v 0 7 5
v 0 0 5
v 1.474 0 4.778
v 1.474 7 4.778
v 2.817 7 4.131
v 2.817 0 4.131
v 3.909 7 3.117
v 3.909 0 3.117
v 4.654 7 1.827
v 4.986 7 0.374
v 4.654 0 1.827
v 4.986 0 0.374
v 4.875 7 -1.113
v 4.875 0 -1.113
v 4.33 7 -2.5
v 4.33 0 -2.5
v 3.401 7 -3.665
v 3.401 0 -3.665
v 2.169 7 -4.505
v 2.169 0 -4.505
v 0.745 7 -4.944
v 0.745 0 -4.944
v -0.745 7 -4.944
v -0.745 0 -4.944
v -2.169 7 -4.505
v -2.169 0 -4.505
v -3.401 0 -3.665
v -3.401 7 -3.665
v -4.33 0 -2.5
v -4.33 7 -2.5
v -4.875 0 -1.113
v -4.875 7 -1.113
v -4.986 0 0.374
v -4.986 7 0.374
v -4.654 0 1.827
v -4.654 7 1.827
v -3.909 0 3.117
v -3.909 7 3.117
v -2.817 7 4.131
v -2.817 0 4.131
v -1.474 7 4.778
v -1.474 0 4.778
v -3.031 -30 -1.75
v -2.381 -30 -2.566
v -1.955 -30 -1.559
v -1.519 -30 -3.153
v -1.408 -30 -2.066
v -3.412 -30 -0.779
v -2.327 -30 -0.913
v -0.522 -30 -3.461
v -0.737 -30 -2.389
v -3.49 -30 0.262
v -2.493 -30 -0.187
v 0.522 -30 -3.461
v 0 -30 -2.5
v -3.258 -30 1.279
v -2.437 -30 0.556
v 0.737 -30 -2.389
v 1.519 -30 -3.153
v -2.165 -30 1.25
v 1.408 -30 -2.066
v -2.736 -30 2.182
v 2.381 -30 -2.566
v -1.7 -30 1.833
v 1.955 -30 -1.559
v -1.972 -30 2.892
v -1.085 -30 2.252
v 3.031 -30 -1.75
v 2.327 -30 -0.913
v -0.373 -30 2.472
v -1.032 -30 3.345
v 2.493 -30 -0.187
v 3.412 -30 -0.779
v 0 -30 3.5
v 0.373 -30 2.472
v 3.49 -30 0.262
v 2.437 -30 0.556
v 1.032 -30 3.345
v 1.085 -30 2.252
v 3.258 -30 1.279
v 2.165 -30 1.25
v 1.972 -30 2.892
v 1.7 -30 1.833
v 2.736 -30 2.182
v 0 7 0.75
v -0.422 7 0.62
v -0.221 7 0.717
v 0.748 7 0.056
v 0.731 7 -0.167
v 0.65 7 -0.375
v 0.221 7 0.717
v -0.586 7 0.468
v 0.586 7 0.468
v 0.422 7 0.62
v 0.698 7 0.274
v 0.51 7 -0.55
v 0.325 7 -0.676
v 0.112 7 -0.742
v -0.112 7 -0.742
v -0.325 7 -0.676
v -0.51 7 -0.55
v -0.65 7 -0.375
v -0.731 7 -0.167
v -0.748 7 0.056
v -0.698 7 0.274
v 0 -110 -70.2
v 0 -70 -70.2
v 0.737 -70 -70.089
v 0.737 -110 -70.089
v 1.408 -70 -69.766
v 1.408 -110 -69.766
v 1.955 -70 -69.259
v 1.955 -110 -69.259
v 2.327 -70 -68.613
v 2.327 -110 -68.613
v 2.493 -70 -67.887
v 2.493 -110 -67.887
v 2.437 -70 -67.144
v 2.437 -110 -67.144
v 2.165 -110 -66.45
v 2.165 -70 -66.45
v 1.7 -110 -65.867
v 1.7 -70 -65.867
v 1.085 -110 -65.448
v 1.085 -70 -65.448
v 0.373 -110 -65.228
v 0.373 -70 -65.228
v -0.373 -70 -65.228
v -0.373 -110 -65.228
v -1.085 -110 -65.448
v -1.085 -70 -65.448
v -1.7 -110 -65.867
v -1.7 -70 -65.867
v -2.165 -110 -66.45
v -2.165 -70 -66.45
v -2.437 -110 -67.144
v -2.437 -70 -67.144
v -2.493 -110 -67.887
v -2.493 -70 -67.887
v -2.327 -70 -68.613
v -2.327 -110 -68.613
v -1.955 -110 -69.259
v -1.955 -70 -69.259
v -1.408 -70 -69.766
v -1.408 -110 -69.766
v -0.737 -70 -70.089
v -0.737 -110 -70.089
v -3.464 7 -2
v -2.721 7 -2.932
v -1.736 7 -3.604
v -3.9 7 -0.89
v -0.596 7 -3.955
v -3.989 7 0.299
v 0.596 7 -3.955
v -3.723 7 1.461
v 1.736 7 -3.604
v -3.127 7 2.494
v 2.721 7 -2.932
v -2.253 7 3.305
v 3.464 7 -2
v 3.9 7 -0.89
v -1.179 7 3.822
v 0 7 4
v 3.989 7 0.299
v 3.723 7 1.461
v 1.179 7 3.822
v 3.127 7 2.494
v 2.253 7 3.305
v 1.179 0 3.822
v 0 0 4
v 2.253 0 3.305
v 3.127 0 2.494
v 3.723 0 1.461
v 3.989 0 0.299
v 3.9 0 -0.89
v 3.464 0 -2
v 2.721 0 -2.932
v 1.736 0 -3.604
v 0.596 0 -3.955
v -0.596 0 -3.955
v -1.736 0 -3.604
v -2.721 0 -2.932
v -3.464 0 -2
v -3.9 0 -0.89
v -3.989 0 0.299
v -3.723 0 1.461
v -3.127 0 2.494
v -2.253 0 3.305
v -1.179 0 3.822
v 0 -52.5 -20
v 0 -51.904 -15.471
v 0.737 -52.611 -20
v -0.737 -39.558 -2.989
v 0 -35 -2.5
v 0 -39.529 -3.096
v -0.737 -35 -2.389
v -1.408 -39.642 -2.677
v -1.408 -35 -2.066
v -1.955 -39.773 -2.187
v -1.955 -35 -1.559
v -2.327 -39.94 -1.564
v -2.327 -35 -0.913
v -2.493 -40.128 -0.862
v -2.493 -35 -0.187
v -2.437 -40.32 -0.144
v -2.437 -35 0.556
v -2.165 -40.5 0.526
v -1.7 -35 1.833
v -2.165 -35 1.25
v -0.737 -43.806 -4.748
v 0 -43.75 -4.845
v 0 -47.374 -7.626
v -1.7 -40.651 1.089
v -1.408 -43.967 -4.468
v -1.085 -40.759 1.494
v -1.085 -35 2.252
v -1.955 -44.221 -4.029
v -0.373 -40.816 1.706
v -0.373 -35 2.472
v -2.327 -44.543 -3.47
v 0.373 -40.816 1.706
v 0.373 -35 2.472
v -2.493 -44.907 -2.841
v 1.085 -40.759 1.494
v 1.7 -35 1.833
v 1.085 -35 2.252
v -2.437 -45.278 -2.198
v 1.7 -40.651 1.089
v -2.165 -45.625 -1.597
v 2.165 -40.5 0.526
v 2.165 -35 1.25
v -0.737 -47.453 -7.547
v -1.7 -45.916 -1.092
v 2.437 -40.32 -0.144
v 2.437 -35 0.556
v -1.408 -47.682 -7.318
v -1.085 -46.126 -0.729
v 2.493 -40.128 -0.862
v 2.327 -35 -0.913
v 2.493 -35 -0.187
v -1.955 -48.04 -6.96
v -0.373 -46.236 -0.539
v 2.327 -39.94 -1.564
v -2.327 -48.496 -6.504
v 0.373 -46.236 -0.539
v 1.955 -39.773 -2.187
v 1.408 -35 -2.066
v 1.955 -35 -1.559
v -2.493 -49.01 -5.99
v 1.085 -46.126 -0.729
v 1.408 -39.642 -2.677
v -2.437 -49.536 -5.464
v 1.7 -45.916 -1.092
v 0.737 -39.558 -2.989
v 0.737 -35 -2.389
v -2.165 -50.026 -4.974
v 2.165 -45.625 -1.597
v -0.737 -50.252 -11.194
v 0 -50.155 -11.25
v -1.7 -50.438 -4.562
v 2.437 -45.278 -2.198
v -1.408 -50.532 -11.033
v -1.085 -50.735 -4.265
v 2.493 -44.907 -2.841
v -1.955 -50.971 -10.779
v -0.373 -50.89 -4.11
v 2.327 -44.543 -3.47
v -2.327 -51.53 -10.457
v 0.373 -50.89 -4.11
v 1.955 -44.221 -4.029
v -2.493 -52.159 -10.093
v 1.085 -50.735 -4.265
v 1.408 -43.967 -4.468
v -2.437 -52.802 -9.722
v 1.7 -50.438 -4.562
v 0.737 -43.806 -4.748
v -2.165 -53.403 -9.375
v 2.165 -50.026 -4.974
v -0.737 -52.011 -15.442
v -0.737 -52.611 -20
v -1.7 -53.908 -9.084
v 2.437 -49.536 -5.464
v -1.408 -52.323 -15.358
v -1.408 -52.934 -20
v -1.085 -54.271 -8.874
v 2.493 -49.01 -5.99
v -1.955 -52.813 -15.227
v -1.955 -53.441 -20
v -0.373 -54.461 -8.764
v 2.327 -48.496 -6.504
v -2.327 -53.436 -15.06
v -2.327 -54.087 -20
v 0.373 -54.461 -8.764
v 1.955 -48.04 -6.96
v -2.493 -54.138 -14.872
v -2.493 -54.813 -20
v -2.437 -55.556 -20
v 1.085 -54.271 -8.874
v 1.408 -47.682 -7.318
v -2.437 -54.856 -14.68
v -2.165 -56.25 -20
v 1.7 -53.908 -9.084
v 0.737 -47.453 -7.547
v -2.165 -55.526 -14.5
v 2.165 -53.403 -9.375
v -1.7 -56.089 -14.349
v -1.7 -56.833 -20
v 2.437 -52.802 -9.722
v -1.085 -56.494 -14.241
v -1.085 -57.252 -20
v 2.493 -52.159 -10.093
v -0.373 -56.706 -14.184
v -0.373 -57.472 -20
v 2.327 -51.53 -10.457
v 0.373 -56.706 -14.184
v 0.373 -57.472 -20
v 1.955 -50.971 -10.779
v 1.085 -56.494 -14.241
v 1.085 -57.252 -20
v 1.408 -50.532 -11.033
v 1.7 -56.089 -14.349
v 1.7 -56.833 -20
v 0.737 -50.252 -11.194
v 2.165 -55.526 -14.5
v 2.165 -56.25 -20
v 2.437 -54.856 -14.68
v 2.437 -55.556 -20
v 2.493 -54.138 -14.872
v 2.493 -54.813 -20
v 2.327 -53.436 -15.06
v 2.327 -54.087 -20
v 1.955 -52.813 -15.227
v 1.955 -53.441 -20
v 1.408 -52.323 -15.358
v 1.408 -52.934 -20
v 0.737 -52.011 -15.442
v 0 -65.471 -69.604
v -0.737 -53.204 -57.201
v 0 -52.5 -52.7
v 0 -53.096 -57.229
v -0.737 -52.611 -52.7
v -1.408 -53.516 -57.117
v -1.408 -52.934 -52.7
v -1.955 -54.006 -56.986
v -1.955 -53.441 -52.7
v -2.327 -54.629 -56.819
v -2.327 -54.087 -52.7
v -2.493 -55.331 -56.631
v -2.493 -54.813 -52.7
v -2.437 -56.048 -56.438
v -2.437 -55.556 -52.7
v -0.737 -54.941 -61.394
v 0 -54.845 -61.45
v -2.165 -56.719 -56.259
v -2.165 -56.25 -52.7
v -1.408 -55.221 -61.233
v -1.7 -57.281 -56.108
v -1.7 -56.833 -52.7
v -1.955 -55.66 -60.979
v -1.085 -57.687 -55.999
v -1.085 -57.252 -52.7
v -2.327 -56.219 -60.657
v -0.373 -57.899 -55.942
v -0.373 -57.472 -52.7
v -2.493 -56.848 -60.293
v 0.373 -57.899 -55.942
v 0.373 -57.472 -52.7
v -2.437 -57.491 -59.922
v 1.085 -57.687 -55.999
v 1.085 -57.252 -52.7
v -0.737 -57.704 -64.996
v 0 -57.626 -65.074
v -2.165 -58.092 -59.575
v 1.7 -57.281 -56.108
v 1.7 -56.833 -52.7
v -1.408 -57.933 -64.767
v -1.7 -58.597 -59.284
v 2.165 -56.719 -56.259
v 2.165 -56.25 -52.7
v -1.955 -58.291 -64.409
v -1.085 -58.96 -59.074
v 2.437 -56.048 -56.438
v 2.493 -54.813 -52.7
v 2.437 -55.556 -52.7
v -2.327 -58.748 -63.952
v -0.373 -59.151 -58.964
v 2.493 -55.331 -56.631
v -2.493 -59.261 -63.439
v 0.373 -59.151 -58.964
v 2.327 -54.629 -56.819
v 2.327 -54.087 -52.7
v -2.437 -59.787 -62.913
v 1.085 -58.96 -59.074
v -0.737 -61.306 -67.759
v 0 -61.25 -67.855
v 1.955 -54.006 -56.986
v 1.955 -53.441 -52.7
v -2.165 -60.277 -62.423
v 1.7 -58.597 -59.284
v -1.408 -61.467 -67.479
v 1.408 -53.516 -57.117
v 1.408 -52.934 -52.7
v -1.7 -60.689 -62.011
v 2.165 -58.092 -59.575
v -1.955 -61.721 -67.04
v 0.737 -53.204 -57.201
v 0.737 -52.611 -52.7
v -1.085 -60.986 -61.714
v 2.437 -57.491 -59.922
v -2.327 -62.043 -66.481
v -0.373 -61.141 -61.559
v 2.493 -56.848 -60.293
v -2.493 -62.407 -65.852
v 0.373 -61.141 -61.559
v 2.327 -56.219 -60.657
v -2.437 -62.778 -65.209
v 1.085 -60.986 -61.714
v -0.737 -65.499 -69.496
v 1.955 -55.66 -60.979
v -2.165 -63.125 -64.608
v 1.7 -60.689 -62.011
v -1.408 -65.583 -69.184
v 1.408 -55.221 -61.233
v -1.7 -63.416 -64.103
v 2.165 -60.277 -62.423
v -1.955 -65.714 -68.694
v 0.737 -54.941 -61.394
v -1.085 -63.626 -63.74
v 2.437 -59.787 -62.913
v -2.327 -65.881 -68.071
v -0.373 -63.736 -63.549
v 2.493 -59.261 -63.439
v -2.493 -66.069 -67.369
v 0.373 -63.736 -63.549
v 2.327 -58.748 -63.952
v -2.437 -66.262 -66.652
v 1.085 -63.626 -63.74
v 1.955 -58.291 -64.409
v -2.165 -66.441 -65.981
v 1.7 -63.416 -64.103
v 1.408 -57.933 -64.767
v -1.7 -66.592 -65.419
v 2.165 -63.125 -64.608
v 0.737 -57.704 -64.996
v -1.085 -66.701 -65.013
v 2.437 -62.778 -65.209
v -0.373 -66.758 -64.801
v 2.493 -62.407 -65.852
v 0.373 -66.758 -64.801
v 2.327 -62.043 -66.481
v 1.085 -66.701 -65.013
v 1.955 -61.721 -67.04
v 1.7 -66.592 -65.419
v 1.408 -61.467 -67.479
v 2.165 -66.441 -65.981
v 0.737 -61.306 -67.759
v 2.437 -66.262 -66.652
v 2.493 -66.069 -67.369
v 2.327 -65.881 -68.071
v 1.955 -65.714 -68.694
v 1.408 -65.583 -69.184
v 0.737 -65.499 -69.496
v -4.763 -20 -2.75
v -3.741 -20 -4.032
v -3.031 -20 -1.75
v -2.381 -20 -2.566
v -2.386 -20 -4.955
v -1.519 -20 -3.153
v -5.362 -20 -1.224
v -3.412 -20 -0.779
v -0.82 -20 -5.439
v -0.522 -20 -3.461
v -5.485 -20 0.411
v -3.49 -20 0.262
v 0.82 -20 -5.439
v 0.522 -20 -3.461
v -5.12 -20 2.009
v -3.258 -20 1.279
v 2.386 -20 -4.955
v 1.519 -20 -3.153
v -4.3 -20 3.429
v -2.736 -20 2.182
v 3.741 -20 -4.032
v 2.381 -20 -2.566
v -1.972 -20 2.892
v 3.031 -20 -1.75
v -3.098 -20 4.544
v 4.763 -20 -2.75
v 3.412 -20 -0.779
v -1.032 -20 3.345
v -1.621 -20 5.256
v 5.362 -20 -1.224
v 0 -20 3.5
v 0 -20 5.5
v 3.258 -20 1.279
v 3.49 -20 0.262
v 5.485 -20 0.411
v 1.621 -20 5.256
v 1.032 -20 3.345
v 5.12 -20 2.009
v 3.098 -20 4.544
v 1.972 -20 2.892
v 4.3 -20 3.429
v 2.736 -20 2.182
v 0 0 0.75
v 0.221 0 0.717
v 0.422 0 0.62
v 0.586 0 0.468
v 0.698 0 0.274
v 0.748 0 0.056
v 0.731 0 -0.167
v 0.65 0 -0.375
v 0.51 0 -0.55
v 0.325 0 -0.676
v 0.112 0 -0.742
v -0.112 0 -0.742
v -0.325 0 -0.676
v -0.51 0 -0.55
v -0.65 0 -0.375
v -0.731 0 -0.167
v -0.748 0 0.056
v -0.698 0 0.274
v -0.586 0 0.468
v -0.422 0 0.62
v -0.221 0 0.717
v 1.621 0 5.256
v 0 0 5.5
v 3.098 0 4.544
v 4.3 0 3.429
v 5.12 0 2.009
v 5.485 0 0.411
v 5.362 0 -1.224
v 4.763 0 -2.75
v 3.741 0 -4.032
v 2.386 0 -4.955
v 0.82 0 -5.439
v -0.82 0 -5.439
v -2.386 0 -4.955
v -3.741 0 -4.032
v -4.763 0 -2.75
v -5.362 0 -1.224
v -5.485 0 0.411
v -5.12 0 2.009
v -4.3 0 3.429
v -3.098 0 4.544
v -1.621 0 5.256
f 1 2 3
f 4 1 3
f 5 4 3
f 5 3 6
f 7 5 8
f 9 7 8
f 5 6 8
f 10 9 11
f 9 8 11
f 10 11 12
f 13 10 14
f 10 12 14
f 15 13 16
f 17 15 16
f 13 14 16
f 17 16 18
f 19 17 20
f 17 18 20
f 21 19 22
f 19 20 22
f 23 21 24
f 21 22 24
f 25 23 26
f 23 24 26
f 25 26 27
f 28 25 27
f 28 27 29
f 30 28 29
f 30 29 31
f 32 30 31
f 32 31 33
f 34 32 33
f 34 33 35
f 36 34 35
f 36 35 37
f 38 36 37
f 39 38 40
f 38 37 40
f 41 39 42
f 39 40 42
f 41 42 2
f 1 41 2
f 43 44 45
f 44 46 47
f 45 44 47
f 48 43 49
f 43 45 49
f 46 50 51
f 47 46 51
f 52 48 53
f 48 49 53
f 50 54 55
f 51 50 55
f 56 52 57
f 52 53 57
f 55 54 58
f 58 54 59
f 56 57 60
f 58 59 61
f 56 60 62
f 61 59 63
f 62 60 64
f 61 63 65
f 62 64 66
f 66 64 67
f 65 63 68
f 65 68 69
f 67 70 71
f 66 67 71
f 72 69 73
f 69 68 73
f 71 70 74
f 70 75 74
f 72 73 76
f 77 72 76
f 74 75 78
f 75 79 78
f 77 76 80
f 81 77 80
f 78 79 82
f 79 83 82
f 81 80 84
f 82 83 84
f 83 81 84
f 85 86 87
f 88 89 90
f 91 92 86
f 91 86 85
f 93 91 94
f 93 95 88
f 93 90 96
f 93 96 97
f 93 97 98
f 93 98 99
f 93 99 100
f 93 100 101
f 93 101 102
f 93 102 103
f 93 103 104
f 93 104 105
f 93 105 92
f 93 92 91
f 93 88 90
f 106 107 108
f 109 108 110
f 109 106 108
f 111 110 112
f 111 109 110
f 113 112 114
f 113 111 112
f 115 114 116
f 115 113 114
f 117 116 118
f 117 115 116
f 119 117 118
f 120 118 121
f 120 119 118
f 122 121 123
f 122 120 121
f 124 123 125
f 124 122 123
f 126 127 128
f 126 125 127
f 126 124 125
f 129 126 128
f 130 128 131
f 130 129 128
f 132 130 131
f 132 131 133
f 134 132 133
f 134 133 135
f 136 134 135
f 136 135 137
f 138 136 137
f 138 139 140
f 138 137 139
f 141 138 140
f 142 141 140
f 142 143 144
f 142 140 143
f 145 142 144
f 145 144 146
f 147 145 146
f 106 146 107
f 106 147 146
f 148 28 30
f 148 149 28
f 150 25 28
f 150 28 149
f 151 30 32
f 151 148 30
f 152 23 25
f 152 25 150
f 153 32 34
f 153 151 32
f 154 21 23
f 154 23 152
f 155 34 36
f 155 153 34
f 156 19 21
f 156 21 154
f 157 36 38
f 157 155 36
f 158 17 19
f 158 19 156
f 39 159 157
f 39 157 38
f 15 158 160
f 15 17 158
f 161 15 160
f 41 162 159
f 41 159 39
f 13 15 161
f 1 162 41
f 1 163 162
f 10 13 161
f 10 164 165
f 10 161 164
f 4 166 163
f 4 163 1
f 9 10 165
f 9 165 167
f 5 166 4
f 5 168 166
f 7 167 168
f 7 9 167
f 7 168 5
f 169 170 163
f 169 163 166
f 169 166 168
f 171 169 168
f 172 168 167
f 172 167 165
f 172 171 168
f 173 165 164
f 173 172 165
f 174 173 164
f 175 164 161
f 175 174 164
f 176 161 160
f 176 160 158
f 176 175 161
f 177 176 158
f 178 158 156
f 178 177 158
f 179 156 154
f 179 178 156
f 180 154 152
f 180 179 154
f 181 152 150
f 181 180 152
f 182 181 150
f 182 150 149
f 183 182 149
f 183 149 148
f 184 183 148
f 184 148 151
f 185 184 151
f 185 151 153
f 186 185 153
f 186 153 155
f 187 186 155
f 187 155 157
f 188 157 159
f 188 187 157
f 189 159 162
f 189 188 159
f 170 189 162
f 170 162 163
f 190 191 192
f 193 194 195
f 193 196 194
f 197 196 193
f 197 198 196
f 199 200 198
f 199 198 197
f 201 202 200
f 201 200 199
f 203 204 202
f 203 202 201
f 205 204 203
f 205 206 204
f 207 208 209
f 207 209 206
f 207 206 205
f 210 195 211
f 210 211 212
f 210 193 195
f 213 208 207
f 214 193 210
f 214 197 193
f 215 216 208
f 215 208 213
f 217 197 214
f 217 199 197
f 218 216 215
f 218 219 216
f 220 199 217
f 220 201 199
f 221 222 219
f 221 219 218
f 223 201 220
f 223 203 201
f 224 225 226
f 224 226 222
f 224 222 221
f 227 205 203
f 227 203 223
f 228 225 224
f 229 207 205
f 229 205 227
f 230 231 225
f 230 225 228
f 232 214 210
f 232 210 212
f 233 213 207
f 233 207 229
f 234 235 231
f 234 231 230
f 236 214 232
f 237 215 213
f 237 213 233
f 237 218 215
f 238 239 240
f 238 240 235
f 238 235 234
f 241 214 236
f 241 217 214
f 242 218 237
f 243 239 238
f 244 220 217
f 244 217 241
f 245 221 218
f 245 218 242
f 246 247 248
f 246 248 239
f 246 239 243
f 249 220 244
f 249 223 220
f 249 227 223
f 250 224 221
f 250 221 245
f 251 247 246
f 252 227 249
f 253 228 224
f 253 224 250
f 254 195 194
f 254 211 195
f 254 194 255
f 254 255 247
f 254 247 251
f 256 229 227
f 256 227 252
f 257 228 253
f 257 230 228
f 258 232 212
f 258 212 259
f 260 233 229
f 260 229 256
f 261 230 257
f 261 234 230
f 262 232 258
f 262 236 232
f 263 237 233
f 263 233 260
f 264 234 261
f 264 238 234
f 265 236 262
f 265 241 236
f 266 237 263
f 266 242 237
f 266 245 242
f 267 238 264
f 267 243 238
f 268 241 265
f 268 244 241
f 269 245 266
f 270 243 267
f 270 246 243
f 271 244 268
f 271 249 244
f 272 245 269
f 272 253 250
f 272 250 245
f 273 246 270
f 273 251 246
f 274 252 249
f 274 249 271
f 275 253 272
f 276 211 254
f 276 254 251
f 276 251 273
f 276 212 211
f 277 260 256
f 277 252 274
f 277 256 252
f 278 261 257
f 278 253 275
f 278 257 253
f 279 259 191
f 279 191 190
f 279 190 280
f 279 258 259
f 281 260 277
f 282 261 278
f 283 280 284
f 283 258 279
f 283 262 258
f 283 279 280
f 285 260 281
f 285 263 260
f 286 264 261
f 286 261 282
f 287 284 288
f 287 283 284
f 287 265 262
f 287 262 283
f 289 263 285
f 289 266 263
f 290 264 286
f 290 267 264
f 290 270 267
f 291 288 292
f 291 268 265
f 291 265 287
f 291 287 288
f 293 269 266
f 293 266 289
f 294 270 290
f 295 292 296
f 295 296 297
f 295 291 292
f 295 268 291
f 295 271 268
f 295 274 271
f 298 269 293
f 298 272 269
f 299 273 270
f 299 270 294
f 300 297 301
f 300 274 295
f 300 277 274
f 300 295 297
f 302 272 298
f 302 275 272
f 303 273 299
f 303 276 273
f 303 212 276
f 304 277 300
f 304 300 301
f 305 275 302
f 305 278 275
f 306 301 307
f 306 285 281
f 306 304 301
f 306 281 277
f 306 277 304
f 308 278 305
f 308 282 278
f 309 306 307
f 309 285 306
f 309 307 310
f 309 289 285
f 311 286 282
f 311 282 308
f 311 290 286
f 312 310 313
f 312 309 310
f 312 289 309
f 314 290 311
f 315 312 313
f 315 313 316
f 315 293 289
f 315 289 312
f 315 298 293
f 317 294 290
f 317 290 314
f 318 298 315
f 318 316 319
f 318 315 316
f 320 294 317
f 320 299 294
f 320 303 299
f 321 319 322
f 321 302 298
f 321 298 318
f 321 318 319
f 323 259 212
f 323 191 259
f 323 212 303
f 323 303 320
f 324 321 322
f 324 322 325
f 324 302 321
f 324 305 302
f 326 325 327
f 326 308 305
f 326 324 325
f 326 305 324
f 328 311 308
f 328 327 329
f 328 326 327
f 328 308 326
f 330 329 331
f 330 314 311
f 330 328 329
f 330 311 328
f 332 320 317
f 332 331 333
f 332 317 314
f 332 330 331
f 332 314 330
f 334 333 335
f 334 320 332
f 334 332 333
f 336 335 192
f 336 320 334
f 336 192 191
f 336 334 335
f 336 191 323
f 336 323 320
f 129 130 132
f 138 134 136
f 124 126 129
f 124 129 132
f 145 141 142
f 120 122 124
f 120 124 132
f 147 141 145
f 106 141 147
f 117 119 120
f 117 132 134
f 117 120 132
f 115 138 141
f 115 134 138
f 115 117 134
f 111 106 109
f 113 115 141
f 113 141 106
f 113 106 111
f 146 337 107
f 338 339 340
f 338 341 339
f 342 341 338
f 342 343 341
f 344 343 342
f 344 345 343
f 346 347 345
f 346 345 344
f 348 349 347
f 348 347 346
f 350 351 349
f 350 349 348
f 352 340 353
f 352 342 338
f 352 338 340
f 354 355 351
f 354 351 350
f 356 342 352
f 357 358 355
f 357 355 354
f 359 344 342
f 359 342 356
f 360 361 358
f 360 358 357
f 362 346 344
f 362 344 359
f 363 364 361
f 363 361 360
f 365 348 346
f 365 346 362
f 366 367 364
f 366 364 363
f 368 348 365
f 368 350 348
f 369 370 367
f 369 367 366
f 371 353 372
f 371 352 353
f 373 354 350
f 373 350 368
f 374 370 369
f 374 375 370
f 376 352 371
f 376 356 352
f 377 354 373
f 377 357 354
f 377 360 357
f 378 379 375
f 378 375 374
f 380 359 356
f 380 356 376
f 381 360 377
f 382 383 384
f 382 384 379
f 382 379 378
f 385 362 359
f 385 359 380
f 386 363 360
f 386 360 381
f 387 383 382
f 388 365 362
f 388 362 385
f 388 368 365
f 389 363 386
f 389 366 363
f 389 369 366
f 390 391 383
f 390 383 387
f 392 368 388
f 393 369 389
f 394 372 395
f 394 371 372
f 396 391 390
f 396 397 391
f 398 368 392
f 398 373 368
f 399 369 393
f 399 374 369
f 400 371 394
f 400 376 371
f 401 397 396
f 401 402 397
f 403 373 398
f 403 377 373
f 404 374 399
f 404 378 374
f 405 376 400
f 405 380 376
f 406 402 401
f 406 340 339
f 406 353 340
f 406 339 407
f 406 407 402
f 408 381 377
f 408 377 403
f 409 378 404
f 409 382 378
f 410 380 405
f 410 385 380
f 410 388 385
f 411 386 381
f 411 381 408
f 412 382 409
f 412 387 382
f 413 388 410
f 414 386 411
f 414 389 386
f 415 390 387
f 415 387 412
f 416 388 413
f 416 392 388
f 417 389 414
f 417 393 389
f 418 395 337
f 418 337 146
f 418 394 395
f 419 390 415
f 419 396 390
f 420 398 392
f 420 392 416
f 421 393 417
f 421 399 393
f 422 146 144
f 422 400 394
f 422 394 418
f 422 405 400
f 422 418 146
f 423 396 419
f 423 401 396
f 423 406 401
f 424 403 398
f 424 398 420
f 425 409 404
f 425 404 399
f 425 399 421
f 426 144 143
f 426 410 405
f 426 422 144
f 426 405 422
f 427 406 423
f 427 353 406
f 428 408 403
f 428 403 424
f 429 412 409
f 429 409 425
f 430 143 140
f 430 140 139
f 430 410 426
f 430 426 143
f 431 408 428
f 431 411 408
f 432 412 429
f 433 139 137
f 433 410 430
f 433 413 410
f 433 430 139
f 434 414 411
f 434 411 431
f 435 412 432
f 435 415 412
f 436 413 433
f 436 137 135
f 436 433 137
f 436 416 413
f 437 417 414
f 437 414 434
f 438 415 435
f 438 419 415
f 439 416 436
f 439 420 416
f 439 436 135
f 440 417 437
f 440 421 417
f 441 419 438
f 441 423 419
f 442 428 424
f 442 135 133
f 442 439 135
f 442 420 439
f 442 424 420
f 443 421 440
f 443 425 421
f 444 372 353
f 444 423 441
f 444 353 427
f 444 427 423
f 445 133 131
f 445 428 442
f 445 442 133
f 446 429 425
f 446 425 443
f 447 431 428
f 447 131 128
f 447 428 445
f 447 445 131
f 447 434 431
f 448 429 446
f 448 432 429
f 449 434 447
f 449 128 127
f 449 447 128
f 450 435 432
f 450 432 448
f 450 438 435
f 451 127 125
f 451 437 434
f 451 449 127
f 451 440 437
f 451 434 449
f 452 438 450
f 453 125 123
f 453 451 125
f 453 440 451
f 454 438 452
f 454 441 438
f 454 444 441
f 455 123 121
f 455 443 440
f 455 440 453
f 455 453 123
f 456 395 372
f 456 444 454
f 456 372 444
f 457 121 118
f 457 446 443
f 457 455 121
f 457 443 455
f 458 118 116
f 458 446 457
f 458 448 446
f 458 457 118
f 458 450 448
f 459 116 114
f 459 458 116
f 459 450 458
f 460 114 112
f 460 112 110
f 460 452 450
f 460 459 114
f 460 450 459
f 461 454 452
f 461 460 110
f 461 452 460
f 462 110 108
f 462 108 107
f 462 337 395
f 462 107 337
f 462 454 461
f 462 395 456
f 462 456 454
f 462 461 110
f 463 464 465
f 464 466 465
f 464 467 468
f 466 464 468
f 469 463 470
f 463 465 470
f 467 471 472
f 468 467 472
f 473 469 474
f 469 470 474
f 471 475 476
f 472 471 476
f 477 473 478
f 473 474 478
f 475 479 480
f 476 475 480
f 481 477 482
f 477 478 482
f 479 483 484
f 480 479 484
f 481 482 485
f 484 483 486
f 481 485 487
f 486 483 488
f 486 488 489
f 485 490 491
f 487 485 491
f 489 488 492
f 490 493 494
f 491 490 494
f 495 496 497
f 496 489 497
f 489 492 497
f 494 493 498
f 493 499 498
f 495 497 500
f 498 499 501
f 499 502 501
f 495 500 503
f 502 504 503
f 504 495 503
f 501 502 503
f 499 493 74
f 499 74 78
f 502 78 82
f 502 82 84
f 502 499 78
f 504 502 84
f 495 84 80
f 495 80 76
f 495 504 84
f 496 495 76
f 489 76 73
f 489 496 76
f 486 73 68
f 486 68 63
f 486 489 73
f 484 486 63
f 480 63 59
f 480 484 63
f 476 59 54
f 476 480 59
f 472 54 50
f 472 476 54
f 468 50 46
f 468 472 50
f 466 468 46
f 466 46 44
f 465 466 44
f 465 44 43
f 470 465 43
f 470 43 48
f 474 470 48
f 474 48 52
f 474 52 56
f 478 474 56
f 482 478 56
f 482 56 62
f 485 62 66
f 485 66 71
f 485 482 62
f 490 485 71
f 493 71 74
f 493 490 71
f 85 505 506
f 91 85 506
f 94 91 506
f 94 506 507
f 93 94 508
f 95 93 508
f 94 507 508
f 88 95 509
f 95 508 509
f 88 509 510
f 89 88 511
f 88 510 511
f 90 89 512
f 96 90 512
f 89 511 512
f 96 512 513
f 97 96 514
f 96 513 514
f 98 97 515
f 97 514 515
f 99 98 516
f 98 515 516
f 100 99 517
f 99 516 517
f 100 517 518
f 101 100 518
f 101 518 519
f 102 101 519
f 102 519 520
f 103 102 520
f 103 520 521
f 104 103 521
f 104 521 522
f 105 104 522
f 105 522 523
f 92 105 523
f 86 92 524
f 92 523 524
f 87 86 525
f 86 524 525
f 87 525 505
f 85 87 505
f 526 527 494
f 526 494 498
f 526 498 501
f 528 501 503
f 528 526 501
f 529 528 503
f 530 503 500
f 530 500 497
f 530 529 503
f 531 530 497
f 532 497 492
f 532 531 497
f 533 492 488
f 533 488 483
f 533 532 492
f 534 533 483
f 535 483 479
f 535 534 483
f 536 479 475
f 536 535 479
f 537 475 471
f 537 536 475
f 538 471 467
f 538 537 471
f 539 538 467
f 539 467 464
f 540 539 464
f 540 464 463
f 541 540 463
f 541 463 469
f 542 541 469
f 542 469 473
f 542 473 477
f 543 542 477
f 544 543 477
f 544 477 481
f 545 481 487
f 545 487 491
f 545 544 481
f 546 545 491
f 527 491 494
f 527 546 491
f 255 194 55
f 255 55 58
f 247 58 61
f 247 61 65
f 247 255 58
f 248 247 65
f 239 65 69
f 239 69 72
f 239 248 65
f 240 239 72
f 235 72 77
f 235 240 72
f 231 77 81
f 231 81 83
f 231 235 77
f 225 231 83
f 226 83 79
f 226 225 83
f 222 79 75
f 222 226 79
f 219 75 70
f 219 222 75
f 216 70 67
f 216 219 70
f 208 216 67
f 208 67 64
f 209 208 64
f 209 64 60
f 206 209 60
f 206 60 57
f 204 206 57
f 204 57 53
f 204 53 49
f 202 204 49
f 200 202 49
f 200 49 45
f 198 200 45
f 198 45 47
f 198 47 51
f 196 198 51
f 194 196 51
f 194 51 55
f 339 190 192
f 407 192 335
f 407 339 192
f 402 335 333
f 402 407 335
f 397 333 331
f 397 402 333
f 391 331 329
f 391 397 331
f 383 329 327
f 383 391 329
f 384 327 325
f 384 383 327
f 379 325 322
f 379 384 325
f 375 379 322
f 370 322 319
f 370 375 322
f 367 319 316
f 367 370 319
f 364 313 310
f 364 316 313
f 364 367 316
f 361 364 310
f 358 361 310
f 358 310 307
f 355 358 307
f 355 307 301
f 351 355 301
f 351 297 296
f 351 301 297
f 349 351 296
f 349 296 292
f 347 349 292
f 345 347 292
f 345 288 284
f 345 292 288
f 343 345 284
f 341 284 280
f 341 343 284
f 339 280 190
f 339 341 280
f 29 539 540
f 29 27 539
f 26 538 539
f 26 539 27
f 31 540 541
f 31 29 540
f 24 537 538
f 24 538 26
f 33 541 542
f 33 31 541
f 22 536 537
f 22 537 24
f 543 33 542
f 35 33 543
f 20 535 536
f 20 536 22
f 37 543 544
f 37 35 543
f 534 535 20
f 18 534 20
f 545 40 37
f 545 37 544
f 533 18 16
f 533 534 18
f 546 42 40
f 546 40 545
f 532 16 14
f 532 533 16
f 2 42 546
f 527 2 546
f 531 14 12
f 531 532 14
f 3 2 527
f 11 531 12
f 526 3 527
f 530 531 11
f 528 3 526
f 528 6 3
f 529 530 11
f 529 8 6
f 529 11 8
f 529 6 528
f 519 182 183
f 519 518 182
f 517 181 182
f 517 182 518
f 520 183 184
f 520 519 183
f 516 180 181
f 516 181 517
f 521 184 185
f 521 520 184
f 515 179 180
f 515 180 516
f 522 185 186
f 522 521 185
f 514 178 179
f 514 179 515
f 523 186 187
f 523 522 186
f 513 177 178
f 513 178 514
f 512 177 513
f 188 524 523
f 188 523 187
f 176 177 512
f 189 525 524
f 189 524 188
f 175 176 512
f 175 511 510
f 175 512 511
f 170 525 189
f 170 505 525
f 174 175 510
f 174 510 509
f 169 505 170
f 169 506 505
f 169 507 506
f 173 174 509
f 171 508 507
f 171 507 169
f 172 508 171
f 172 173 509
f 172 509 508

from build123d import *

# Parameters (mm, degrees)
SKETCH1_R           = 5.5
HANDLE_DEPTH        = 20
SKETCH2_R           = 5
SKETCH2_R_2         = 4
SLEEVE_DEPTH        = 7
SKETCH3_R           = 0.75
CENTRE_PIN_DEPTH    = 7
SKETCH4_R           = 3.5
STRAIN_RELIEF_DEPTH = 10
LEAD_PROFILE_R      = 2.5


with BuildPart() as part:
    # Sketch1 → Handle (new body)
    with BuildSketch(Plane(origin=(0, 0, 0), x_dir=(1, 0, 0), z_dir=(0, 1, 0))):
        with Locations(Location((0, 0, 0), (0, 0, 270))):
            Circle(SKETCH1_R)
    extrude(amount=-HANDLE_DEPTH)

    # Sketch2 → Sleeve (add)
    with BuildSketch(Plane(origin=(0, 0, 0), x_dir=(1, 0, 0), z_dir=(0, 1, 0))):
        with Locations(Location((0, 0, 0), (0, 0, 270))):
            Circle(SKETCH2_R)
        with Locations(Location((0, 0, 0), (0, 0, 270))):
            Circle(SKETCH2_R_2, mode=Mode.SUBTRACT)
    extrude(amount=SLEEVE_DEPTH)

    # Sketch3 → Centre_pin (add)
    with BuildSketch(Plane(origin=(0, 0, 0), x_dir=(1, 0, 0), z_dir=(0, 1, 0))):
        with Locations(Location((0, 0, 0), (0, 0, 270))):
            Circle(SKETCH3_R)
    extrude(amount=CENTRE_PIN_DEPTH)

    # Sketch4 → Strain_relief (add)
    with BuildSketch(Plane(origin=(0, -20, 0), x_dir=(1, 0, 0), z_dir=(0, 1, 0))):
        with Locations(Location((0, 0, 0), (0, 0, 270))):
            Circle(SKETCH4_R)
    extrude(amount=-STRAIN_RELIEF_DEPTH)

    # Lead: sweep along a path in Sketch5
    with BuildLine(Plane(origin=(0, 0, 0), x_dir=(0, 0, -1), z_dir=(1, 0, 0))) as lead_path:
        Line((0, -30), (0, -35))
        ThreePointArc((0, -35), (5.857864376, -49.142135624), (20, -55))
        Line((20, -55), (52.7, -55))
        ThreePointArc((52.7, -55), (63.306601718, -59.393398282), (67.7, -70))
        Line((67.7, -70), (67.7, -110))
    # Lead profile (on start of the path) → Lead (sweep)
    with BuildSketch(Plane(origin=(0, -30, 0), x_dir=(0, 0, -1), z_dir=(0, -1, 0))):
        Circle(LEAD_PROFILE_R)
    sweep(path=lead_path.line)


solid = part.part
